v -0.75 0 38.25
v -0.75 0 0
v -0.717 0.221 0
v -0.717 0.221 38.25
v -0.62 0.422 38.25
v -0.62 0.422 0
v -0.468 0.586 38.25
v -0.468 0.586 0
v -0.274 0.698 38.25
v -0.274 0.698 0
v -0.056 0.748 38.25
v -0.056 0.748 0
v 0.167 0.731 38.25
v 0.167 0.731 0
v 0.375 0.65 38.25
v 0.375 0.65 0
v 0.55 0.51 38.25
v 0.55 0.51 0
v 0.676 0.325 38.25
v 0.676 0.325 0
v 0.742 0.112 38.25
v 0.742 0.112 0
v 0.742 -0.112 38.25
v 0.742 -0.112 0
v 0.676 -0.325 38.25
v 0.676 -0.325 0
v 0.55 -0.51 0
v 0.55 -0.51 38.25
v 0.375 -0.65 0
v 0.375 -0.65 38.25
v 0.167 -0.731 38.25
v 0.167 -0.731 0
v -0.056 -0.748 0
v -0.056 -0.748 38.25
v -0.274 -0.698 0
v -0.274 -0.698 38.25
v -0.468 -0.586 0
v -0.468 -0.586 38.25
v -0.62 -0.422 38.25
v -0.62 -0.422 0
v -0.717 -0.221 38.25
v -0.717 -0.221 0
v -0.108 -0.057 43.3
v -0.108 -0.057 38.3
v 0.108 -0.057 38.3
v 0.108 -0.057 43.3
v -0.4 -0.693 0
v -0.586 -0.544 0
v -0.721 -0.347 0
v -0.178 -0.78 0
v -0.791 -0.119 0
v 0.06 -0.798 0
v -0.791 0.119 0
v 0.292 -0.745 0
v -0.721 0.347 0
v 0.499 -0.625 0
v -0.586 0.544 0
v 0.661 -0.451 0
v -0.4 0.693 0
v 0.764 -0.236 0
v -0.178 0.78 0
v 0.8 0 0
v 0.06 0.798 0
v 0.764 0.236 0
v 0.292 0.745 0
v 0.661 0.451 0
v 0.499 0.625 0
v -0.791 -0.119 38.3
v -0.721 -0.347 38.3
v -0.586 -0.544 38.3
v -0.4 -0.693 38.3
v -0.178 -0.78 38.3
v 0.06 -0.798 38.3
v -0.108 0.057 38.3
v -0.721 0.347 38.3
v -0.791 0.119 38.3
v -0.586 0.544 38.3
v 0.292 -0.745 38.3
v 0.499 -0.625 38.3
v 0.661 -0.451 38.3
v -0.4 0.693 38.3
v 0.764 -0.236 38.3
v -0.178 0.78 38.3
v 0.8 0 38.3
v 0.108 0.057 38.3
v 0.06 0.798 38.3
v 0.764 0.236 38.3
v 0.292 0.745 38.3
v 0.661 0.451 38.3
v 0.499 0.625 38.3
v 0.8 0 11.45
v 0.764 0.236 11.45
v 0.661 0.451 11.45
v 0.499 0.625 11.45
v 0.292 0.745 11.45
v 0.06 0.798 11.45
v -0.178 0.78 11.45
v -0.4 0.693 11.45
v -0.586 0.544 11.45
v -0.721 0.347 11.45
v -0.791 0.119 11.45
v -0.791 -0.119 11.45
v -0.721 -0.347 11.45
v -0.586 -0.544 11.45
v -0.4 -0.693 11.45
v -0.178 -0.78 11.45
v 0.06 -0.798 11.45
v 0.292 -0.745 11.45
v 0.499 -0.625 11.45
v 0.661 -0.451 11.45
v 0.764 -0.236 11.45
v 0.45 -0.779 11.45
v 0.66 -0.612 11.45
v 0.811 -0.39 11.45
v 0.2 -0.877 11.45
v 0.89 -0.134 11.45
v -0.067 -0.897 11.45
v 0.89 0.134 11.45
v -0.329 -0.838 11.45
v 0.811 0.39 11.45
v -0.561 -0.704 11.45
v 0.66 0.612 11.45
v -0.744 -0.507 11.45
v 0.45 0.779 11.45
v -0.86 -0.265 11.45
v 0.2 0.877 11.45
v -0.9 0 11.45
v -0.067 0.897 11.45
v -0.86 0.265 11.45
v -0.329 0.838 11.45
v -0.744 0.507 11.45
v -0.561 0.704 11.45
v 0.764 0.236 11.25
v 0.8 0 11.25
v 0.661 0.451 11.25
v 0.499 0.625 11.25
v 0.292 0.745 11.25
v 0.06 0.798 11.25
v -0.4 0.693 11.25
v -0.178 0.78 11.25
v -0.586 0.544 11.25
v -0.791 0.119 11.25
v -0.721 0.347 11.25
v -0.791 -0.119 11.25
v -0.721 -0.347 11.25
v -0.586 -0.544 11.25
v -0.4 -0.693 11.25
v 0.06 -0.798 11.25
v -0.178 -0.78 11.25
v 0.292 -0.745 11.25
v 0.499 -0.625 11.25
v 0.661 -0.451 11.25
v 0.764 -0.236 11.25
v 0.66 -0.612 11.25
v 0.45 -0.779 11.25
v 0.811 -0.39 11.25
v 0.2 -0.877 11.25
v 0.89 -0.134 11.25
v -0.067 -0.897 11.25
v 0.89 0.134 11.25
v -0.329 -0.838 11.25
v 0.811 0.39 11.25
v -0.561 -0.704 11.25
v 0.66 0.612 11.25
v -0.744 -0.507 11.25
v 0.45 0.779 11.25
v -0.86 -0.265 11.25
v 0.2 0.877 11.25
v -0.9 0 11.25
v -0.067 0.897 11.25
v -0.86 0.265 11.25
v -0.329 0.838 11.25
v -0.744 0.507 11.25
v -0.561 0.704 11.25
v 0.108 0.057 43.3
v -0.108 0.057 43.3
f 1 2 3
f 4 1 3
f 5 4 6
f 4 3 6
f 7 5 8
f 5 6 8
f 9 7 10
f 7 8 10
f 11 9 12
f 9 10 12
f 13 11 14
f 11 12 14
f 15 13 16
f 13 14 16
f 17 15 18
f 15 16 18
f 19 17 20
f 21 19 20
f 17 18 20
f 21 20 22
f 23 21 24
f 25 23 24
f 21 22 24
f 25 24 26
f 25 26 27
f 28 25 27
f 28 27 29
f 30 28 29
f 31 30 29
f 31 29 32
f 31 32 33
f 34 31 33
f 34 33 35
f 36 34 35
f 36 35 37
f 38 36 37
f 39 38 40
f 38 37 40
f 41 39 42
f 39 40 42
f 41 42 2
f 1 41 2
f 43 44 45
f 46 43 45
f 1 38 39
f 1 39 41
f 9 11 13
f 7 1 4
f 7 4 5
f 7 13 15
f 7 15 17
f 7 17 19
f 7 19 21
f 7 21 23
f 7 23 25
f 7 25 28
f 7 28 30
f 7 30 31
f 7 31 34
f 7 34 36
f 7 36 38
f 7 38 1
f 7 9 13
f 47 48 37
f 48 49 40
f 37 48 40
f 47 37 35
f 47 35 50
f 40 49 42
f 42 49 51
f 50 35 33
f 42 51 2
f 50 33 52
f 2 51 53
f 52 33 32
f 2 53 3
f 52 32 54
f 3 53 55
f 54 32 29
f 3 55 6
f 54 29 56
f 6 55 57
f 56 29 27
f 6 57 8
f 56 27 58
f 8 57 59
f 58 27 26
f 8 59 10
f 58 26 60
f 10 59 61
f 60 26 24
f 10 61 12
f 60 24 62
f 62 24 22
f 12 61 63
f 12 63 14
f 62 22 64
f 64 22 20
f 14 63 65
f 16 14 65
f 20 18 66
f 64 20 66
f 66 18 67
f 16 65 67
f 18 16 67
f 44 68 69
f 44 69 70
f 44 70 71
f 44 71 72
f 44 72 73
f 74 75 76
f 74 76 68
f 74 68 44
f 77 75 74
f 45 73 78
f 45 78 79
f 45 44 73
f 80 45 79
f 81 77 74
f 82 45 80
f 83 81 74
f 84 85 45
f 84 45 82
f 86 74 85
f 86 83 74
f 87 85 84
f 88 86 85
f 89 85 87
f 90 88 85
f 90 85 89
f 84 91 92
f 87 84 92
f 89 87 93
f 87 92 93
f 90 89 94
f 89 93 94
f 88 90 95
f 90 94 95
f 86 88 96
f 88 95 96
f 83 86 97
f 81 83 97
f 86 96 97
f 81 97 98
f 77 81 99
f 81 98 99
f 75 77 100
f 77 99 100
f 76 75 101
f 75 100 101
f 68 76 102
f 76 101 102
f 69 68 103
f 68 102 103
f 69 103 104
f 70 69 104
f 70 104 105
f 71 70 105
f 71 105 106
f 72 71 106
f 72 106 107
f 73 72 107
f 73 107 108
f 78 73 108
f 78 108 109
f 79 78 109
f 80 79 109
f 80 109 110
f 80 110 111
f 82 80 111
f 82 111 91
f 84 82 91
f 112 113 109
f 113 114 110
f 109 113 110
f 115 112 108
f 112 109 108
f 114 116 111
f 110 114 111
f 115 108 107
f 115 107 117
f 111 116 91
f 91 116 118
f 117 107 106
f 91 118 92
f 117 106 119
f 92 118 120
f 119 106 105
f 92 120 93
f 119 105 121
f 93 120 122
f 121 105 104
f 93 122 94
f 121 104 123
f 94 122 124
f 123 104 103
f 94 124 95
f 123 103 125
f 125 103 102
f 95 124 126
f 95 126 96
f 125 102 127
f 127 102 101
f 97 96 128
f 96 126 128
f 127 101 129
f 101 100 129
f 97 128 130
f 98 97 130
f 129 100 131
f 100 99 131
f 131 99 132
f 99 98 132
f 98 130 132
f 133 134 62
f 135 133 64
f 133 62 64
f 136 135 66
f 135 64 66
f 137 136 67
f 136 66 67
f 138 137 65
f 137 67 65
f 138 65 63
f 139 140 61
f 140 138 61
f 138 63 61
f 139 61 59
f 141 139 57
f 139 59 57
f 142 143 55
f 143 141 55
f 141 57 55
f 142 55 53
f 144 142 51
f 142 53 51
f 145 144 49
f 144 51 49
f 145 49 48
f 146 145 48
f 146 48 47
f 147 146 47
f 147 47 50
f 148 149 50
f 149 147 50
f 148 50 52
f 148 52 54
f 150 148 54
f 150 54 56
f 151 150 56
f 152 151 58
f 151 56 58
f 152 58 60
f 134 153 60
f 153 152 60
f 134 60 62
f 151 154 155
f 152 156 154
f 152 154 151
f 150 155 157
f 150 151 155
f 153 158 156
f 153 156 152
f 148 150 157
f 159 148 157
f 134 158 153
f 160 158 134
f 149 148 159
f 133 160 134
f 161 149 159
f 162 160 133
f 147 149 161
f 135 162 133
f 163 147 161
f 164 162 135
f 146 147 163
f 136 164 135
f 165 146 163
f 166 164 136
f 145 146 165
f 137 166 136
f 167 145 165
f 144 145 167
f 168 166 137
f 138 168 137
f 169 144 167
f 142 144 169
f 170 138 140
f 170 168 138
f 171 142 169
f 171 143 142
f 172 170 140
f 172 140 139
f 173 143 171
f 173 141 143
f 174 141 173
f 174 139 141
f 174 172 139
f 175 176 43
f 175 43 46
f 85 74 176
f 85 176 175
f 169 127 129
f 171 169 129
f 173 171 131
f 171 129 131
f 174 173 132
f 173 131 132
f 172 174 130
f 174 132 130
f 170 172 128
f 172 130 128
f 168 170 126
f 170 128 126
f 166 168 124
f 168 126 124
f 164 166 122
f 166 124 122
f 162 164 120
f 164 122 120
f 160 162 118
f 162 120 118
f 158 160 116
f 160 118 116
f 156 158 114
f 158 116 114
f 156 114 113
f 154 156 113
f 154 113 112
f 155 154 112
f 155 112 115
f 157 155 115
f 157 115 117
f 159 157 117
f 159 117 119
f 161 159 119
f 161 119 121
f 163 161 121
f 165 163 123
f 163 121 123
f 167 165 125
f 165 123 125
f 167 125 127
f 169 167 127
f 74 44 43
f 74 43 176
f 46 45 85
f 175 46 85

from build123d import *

# Parameters (mm, degrees)
SKETCH4_R           = 0.8
BOSS_EXTRUDE2_DEPTH = 38.3
SKETCH6_R           = 0.9
BOSS_EXTRUDE3_DEPTH = 0.2
SKETCH7_R           = 0.75
CUT_EXTRUDE1_DEPTH  = 38.25
SKETCH8_W           = 0.215319984
SKETCH8_H           = 0.113992932
BOSS_EXTRUDE4_DEPTH = 5


with BuildPart() as part:
    # Sketch4 → Boss-Extrude2 (new body)
    with BuildSketch(Plane.XY):
        Circle(SKETCH4_R)
    extrude(amount=BOSS_EXTRUDE2_DEPTH)

    # Sketch6 → Boss-Extrude3 (add)
    with BuildSketch(Plane(origin=(0, 0, 11.45), x_dir=(-1, 0, 0), z_dir=(0, 0, -1))):
        Circle(SKETCH6_R)
    extrude(amount=BOSS_EXTRUDE3_DEPTH)

    # Sketch7 → Cut-Extrude1 (cut)
    with BuildSketch(Plane(origin=(0, 0, 0), x_dir=(-1, 0, 0), z_dir=(0, 0, -1))):
        Circle(SKETCH7_R)
    extrude(amount=-CUT_EXTRUDE1_DEPTH, mode=Mode.SUBTRACT)

    # Sketch8 → Boss-Extrude4 (add)
    with BuildSketch(Plane.XY.offset(38.3)):
        Rectangle(SKETCH8_W, SKETCH8_H)
    extrude(amount=BOSS_EXTRUDE4_DEPTH)


solid = part.part
